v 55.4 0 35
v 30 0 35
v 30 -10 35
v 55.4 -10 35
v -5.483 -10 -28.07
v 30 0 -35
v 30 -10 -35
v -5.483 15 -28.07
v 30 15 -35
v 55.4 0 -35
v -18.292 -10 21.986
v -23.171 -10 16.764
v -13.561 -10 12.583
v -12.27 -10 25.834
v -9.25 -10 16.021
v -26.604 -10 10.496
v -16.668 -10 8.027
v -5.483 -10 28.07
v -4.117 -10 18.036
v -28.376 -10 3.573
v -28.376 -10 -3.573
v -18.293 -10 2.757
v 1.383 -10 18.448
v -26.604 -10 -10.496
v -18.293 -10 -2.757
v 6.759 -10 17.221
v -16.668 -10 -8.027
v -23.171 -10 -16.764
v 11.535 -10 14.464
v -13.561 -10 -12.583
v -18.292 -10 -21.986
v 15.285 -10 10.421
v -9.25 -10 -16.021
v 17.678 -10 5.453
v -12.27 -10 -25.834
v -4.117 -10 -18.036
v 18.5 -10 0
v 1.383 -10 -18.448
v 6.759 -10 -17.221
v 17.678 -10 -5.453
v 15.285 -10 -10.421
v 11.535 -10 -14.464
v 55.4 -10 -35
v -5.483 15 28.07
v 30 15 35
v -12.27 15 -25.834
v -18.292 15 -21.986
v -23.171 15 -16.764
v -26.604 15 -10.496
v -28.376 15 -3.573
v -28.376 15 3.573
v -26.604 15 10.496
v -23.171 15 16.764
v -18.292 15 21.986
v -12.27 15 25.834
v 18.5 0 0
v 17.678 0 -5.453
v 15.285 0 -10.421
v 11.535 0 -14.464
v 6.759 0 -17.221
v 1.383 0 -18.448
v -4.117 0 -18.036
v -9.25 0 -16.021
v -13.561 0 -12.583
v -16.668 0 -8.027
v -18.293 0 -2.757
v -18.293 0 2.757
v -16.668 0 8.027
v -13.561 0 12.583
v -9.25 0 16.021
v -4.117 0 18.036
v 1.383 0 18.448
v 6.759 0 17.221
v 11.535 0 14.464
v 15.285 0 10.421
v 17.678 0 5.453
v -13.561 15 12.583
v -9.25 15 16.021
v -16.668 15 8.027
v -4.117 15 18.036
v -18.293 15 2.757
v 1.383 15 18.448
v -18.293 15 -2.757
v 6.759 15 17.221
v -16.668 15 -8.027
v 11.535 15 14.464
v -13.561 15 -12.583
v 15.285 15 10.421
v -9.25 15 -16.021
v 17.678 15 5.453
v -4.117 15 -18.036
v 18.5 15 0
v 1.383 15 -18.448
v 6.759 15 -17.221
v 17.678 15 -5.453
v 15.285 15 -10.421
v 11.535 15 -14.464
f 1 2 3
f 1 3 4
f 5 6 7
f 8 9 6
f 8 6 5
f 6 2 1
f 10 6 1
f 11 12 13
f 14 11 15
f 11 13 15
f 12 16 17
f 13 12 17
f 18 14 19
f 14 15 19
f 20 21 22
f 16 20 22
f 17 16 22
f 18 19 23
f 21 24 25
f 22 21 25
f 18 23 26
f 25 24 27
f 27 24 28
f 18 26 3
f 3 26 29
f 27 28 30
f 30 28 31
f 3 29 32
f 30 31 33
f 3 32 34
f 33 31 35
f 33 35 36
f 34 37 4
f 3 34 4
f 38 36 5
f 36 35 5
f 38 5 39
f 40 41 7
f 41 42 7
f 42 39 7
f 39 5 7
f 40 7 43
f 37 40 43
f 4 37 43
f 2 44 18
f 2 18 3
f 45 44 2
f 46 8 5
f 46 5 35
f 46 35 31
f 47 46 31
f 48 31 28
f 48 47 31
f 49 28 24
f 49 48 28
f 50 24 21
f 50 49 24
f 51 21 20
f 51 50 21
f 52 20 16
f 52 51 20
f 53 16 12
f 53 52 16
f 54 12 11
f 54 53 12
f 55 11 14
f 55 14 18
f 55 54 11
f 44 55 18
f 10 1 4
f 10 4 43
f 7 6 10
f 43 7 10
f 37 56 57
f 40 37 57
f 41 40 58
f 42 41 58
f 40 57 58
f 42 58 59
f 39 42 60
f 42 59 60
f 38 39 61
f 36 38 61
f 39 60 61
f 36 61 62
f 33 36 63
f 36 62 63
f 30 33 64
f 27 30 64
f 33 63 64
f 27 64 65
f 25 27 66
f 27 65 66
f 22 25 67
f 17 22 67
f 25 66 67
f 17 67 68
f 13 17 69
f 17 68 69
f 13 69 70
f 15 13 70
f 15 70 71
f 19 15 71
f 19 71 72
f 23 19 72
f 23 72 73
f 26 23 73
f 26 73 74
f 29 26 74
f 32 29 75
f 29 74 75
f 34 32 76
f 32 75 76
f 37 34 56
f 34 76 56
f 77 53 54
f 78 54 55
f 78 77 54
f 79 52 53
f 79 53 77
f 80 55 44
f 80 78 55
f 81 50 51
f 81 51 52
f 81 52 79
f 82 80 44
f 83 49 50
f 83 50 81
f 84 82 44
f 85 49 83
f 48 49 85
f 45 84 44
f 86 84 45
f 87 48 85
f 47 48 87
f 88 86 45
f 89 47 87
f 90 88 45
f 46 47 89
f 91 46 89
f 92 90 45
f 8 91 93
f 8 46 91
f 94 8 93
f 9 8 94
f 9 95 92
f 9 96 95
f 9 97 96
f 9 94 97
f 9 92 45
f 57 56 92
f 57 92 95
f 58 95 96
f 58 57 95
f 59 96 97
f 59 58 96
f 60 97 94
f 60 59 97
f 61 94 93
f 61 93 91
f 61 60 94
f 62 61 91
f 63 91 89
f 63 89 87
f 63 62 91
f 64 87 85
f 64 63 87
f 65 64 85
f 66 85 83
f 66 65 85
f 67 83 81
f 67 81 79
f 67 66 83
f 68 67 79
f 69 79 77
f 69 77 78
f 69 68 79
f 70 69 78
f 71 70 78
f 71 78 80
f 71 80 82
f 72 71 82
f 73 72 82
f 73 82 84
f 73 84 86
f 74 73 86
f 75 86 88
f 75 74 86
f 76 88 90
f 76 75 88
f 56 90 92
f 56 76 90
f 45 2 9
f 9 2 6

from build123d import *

# Parameters (mm, degrees)
SKETCH1_R           = 18.5
BOSS_EXTRUDE2_DEPTH = 15
BOSS_EXTRUDE3_START = -10
SKETCH1_3_R         = 18.5
BOSS_EXTRUDE3_DEPTH = 10


with BuildPart() as part:
    # Sketch1 → Boss-Extrude2 (new body)
    with BuildSketch(Plane(origin=(0, 0, 0), x_dir=(1, 0, 0), z_dir=(0, 1, 0))):
        with BuildLine():
            Line((-5.482522909, -28.069591065), (30, -35))
            Line((30, -35), (30, 35))
            Line((30, 35), (-5.482522909, 28.069591065))
            ThreePointArc((-5.482522909, 28.069591065), (-28.6, 0), (-5.482522909, -28.069591065))
        make_face()
        Circle(SKETCH1_R, mode=Mode.SUBTRACT)
    extrude(amount=BOSS_EXTRUDE2_DEPTH)

    # Sketch1<3> → Boss-Extrude3 (add)
    with BuildSketch(Plane(origin=(0, 0, 0), x_dir=(1, 0, 0), z_dir=(0, 1, 0)).offset(BOSS_EXTRUDE3_START)):
        with BuildLine():
            Line((-5.482522909, -28.069591065), (30, -35))
            Line((30, -35), (55.4, -35))
            Line((55.4, -35), (55.4, 35))
            Line((55.4, 35), (30, 35))
            Line((30, 35), (-5.482522909, 28.069591065))
            ThreePointArc((-5.482522909, 28.069591065), (-28.6, 0), (-5.482522909, -28.069591065))
        make_face()
        Circle(SKETCH1_3_R, mode=Mode.SUBTRACT)
    extrude(amount=BOSS_EXTRUDE3_DEPTH)


solid = part.part
